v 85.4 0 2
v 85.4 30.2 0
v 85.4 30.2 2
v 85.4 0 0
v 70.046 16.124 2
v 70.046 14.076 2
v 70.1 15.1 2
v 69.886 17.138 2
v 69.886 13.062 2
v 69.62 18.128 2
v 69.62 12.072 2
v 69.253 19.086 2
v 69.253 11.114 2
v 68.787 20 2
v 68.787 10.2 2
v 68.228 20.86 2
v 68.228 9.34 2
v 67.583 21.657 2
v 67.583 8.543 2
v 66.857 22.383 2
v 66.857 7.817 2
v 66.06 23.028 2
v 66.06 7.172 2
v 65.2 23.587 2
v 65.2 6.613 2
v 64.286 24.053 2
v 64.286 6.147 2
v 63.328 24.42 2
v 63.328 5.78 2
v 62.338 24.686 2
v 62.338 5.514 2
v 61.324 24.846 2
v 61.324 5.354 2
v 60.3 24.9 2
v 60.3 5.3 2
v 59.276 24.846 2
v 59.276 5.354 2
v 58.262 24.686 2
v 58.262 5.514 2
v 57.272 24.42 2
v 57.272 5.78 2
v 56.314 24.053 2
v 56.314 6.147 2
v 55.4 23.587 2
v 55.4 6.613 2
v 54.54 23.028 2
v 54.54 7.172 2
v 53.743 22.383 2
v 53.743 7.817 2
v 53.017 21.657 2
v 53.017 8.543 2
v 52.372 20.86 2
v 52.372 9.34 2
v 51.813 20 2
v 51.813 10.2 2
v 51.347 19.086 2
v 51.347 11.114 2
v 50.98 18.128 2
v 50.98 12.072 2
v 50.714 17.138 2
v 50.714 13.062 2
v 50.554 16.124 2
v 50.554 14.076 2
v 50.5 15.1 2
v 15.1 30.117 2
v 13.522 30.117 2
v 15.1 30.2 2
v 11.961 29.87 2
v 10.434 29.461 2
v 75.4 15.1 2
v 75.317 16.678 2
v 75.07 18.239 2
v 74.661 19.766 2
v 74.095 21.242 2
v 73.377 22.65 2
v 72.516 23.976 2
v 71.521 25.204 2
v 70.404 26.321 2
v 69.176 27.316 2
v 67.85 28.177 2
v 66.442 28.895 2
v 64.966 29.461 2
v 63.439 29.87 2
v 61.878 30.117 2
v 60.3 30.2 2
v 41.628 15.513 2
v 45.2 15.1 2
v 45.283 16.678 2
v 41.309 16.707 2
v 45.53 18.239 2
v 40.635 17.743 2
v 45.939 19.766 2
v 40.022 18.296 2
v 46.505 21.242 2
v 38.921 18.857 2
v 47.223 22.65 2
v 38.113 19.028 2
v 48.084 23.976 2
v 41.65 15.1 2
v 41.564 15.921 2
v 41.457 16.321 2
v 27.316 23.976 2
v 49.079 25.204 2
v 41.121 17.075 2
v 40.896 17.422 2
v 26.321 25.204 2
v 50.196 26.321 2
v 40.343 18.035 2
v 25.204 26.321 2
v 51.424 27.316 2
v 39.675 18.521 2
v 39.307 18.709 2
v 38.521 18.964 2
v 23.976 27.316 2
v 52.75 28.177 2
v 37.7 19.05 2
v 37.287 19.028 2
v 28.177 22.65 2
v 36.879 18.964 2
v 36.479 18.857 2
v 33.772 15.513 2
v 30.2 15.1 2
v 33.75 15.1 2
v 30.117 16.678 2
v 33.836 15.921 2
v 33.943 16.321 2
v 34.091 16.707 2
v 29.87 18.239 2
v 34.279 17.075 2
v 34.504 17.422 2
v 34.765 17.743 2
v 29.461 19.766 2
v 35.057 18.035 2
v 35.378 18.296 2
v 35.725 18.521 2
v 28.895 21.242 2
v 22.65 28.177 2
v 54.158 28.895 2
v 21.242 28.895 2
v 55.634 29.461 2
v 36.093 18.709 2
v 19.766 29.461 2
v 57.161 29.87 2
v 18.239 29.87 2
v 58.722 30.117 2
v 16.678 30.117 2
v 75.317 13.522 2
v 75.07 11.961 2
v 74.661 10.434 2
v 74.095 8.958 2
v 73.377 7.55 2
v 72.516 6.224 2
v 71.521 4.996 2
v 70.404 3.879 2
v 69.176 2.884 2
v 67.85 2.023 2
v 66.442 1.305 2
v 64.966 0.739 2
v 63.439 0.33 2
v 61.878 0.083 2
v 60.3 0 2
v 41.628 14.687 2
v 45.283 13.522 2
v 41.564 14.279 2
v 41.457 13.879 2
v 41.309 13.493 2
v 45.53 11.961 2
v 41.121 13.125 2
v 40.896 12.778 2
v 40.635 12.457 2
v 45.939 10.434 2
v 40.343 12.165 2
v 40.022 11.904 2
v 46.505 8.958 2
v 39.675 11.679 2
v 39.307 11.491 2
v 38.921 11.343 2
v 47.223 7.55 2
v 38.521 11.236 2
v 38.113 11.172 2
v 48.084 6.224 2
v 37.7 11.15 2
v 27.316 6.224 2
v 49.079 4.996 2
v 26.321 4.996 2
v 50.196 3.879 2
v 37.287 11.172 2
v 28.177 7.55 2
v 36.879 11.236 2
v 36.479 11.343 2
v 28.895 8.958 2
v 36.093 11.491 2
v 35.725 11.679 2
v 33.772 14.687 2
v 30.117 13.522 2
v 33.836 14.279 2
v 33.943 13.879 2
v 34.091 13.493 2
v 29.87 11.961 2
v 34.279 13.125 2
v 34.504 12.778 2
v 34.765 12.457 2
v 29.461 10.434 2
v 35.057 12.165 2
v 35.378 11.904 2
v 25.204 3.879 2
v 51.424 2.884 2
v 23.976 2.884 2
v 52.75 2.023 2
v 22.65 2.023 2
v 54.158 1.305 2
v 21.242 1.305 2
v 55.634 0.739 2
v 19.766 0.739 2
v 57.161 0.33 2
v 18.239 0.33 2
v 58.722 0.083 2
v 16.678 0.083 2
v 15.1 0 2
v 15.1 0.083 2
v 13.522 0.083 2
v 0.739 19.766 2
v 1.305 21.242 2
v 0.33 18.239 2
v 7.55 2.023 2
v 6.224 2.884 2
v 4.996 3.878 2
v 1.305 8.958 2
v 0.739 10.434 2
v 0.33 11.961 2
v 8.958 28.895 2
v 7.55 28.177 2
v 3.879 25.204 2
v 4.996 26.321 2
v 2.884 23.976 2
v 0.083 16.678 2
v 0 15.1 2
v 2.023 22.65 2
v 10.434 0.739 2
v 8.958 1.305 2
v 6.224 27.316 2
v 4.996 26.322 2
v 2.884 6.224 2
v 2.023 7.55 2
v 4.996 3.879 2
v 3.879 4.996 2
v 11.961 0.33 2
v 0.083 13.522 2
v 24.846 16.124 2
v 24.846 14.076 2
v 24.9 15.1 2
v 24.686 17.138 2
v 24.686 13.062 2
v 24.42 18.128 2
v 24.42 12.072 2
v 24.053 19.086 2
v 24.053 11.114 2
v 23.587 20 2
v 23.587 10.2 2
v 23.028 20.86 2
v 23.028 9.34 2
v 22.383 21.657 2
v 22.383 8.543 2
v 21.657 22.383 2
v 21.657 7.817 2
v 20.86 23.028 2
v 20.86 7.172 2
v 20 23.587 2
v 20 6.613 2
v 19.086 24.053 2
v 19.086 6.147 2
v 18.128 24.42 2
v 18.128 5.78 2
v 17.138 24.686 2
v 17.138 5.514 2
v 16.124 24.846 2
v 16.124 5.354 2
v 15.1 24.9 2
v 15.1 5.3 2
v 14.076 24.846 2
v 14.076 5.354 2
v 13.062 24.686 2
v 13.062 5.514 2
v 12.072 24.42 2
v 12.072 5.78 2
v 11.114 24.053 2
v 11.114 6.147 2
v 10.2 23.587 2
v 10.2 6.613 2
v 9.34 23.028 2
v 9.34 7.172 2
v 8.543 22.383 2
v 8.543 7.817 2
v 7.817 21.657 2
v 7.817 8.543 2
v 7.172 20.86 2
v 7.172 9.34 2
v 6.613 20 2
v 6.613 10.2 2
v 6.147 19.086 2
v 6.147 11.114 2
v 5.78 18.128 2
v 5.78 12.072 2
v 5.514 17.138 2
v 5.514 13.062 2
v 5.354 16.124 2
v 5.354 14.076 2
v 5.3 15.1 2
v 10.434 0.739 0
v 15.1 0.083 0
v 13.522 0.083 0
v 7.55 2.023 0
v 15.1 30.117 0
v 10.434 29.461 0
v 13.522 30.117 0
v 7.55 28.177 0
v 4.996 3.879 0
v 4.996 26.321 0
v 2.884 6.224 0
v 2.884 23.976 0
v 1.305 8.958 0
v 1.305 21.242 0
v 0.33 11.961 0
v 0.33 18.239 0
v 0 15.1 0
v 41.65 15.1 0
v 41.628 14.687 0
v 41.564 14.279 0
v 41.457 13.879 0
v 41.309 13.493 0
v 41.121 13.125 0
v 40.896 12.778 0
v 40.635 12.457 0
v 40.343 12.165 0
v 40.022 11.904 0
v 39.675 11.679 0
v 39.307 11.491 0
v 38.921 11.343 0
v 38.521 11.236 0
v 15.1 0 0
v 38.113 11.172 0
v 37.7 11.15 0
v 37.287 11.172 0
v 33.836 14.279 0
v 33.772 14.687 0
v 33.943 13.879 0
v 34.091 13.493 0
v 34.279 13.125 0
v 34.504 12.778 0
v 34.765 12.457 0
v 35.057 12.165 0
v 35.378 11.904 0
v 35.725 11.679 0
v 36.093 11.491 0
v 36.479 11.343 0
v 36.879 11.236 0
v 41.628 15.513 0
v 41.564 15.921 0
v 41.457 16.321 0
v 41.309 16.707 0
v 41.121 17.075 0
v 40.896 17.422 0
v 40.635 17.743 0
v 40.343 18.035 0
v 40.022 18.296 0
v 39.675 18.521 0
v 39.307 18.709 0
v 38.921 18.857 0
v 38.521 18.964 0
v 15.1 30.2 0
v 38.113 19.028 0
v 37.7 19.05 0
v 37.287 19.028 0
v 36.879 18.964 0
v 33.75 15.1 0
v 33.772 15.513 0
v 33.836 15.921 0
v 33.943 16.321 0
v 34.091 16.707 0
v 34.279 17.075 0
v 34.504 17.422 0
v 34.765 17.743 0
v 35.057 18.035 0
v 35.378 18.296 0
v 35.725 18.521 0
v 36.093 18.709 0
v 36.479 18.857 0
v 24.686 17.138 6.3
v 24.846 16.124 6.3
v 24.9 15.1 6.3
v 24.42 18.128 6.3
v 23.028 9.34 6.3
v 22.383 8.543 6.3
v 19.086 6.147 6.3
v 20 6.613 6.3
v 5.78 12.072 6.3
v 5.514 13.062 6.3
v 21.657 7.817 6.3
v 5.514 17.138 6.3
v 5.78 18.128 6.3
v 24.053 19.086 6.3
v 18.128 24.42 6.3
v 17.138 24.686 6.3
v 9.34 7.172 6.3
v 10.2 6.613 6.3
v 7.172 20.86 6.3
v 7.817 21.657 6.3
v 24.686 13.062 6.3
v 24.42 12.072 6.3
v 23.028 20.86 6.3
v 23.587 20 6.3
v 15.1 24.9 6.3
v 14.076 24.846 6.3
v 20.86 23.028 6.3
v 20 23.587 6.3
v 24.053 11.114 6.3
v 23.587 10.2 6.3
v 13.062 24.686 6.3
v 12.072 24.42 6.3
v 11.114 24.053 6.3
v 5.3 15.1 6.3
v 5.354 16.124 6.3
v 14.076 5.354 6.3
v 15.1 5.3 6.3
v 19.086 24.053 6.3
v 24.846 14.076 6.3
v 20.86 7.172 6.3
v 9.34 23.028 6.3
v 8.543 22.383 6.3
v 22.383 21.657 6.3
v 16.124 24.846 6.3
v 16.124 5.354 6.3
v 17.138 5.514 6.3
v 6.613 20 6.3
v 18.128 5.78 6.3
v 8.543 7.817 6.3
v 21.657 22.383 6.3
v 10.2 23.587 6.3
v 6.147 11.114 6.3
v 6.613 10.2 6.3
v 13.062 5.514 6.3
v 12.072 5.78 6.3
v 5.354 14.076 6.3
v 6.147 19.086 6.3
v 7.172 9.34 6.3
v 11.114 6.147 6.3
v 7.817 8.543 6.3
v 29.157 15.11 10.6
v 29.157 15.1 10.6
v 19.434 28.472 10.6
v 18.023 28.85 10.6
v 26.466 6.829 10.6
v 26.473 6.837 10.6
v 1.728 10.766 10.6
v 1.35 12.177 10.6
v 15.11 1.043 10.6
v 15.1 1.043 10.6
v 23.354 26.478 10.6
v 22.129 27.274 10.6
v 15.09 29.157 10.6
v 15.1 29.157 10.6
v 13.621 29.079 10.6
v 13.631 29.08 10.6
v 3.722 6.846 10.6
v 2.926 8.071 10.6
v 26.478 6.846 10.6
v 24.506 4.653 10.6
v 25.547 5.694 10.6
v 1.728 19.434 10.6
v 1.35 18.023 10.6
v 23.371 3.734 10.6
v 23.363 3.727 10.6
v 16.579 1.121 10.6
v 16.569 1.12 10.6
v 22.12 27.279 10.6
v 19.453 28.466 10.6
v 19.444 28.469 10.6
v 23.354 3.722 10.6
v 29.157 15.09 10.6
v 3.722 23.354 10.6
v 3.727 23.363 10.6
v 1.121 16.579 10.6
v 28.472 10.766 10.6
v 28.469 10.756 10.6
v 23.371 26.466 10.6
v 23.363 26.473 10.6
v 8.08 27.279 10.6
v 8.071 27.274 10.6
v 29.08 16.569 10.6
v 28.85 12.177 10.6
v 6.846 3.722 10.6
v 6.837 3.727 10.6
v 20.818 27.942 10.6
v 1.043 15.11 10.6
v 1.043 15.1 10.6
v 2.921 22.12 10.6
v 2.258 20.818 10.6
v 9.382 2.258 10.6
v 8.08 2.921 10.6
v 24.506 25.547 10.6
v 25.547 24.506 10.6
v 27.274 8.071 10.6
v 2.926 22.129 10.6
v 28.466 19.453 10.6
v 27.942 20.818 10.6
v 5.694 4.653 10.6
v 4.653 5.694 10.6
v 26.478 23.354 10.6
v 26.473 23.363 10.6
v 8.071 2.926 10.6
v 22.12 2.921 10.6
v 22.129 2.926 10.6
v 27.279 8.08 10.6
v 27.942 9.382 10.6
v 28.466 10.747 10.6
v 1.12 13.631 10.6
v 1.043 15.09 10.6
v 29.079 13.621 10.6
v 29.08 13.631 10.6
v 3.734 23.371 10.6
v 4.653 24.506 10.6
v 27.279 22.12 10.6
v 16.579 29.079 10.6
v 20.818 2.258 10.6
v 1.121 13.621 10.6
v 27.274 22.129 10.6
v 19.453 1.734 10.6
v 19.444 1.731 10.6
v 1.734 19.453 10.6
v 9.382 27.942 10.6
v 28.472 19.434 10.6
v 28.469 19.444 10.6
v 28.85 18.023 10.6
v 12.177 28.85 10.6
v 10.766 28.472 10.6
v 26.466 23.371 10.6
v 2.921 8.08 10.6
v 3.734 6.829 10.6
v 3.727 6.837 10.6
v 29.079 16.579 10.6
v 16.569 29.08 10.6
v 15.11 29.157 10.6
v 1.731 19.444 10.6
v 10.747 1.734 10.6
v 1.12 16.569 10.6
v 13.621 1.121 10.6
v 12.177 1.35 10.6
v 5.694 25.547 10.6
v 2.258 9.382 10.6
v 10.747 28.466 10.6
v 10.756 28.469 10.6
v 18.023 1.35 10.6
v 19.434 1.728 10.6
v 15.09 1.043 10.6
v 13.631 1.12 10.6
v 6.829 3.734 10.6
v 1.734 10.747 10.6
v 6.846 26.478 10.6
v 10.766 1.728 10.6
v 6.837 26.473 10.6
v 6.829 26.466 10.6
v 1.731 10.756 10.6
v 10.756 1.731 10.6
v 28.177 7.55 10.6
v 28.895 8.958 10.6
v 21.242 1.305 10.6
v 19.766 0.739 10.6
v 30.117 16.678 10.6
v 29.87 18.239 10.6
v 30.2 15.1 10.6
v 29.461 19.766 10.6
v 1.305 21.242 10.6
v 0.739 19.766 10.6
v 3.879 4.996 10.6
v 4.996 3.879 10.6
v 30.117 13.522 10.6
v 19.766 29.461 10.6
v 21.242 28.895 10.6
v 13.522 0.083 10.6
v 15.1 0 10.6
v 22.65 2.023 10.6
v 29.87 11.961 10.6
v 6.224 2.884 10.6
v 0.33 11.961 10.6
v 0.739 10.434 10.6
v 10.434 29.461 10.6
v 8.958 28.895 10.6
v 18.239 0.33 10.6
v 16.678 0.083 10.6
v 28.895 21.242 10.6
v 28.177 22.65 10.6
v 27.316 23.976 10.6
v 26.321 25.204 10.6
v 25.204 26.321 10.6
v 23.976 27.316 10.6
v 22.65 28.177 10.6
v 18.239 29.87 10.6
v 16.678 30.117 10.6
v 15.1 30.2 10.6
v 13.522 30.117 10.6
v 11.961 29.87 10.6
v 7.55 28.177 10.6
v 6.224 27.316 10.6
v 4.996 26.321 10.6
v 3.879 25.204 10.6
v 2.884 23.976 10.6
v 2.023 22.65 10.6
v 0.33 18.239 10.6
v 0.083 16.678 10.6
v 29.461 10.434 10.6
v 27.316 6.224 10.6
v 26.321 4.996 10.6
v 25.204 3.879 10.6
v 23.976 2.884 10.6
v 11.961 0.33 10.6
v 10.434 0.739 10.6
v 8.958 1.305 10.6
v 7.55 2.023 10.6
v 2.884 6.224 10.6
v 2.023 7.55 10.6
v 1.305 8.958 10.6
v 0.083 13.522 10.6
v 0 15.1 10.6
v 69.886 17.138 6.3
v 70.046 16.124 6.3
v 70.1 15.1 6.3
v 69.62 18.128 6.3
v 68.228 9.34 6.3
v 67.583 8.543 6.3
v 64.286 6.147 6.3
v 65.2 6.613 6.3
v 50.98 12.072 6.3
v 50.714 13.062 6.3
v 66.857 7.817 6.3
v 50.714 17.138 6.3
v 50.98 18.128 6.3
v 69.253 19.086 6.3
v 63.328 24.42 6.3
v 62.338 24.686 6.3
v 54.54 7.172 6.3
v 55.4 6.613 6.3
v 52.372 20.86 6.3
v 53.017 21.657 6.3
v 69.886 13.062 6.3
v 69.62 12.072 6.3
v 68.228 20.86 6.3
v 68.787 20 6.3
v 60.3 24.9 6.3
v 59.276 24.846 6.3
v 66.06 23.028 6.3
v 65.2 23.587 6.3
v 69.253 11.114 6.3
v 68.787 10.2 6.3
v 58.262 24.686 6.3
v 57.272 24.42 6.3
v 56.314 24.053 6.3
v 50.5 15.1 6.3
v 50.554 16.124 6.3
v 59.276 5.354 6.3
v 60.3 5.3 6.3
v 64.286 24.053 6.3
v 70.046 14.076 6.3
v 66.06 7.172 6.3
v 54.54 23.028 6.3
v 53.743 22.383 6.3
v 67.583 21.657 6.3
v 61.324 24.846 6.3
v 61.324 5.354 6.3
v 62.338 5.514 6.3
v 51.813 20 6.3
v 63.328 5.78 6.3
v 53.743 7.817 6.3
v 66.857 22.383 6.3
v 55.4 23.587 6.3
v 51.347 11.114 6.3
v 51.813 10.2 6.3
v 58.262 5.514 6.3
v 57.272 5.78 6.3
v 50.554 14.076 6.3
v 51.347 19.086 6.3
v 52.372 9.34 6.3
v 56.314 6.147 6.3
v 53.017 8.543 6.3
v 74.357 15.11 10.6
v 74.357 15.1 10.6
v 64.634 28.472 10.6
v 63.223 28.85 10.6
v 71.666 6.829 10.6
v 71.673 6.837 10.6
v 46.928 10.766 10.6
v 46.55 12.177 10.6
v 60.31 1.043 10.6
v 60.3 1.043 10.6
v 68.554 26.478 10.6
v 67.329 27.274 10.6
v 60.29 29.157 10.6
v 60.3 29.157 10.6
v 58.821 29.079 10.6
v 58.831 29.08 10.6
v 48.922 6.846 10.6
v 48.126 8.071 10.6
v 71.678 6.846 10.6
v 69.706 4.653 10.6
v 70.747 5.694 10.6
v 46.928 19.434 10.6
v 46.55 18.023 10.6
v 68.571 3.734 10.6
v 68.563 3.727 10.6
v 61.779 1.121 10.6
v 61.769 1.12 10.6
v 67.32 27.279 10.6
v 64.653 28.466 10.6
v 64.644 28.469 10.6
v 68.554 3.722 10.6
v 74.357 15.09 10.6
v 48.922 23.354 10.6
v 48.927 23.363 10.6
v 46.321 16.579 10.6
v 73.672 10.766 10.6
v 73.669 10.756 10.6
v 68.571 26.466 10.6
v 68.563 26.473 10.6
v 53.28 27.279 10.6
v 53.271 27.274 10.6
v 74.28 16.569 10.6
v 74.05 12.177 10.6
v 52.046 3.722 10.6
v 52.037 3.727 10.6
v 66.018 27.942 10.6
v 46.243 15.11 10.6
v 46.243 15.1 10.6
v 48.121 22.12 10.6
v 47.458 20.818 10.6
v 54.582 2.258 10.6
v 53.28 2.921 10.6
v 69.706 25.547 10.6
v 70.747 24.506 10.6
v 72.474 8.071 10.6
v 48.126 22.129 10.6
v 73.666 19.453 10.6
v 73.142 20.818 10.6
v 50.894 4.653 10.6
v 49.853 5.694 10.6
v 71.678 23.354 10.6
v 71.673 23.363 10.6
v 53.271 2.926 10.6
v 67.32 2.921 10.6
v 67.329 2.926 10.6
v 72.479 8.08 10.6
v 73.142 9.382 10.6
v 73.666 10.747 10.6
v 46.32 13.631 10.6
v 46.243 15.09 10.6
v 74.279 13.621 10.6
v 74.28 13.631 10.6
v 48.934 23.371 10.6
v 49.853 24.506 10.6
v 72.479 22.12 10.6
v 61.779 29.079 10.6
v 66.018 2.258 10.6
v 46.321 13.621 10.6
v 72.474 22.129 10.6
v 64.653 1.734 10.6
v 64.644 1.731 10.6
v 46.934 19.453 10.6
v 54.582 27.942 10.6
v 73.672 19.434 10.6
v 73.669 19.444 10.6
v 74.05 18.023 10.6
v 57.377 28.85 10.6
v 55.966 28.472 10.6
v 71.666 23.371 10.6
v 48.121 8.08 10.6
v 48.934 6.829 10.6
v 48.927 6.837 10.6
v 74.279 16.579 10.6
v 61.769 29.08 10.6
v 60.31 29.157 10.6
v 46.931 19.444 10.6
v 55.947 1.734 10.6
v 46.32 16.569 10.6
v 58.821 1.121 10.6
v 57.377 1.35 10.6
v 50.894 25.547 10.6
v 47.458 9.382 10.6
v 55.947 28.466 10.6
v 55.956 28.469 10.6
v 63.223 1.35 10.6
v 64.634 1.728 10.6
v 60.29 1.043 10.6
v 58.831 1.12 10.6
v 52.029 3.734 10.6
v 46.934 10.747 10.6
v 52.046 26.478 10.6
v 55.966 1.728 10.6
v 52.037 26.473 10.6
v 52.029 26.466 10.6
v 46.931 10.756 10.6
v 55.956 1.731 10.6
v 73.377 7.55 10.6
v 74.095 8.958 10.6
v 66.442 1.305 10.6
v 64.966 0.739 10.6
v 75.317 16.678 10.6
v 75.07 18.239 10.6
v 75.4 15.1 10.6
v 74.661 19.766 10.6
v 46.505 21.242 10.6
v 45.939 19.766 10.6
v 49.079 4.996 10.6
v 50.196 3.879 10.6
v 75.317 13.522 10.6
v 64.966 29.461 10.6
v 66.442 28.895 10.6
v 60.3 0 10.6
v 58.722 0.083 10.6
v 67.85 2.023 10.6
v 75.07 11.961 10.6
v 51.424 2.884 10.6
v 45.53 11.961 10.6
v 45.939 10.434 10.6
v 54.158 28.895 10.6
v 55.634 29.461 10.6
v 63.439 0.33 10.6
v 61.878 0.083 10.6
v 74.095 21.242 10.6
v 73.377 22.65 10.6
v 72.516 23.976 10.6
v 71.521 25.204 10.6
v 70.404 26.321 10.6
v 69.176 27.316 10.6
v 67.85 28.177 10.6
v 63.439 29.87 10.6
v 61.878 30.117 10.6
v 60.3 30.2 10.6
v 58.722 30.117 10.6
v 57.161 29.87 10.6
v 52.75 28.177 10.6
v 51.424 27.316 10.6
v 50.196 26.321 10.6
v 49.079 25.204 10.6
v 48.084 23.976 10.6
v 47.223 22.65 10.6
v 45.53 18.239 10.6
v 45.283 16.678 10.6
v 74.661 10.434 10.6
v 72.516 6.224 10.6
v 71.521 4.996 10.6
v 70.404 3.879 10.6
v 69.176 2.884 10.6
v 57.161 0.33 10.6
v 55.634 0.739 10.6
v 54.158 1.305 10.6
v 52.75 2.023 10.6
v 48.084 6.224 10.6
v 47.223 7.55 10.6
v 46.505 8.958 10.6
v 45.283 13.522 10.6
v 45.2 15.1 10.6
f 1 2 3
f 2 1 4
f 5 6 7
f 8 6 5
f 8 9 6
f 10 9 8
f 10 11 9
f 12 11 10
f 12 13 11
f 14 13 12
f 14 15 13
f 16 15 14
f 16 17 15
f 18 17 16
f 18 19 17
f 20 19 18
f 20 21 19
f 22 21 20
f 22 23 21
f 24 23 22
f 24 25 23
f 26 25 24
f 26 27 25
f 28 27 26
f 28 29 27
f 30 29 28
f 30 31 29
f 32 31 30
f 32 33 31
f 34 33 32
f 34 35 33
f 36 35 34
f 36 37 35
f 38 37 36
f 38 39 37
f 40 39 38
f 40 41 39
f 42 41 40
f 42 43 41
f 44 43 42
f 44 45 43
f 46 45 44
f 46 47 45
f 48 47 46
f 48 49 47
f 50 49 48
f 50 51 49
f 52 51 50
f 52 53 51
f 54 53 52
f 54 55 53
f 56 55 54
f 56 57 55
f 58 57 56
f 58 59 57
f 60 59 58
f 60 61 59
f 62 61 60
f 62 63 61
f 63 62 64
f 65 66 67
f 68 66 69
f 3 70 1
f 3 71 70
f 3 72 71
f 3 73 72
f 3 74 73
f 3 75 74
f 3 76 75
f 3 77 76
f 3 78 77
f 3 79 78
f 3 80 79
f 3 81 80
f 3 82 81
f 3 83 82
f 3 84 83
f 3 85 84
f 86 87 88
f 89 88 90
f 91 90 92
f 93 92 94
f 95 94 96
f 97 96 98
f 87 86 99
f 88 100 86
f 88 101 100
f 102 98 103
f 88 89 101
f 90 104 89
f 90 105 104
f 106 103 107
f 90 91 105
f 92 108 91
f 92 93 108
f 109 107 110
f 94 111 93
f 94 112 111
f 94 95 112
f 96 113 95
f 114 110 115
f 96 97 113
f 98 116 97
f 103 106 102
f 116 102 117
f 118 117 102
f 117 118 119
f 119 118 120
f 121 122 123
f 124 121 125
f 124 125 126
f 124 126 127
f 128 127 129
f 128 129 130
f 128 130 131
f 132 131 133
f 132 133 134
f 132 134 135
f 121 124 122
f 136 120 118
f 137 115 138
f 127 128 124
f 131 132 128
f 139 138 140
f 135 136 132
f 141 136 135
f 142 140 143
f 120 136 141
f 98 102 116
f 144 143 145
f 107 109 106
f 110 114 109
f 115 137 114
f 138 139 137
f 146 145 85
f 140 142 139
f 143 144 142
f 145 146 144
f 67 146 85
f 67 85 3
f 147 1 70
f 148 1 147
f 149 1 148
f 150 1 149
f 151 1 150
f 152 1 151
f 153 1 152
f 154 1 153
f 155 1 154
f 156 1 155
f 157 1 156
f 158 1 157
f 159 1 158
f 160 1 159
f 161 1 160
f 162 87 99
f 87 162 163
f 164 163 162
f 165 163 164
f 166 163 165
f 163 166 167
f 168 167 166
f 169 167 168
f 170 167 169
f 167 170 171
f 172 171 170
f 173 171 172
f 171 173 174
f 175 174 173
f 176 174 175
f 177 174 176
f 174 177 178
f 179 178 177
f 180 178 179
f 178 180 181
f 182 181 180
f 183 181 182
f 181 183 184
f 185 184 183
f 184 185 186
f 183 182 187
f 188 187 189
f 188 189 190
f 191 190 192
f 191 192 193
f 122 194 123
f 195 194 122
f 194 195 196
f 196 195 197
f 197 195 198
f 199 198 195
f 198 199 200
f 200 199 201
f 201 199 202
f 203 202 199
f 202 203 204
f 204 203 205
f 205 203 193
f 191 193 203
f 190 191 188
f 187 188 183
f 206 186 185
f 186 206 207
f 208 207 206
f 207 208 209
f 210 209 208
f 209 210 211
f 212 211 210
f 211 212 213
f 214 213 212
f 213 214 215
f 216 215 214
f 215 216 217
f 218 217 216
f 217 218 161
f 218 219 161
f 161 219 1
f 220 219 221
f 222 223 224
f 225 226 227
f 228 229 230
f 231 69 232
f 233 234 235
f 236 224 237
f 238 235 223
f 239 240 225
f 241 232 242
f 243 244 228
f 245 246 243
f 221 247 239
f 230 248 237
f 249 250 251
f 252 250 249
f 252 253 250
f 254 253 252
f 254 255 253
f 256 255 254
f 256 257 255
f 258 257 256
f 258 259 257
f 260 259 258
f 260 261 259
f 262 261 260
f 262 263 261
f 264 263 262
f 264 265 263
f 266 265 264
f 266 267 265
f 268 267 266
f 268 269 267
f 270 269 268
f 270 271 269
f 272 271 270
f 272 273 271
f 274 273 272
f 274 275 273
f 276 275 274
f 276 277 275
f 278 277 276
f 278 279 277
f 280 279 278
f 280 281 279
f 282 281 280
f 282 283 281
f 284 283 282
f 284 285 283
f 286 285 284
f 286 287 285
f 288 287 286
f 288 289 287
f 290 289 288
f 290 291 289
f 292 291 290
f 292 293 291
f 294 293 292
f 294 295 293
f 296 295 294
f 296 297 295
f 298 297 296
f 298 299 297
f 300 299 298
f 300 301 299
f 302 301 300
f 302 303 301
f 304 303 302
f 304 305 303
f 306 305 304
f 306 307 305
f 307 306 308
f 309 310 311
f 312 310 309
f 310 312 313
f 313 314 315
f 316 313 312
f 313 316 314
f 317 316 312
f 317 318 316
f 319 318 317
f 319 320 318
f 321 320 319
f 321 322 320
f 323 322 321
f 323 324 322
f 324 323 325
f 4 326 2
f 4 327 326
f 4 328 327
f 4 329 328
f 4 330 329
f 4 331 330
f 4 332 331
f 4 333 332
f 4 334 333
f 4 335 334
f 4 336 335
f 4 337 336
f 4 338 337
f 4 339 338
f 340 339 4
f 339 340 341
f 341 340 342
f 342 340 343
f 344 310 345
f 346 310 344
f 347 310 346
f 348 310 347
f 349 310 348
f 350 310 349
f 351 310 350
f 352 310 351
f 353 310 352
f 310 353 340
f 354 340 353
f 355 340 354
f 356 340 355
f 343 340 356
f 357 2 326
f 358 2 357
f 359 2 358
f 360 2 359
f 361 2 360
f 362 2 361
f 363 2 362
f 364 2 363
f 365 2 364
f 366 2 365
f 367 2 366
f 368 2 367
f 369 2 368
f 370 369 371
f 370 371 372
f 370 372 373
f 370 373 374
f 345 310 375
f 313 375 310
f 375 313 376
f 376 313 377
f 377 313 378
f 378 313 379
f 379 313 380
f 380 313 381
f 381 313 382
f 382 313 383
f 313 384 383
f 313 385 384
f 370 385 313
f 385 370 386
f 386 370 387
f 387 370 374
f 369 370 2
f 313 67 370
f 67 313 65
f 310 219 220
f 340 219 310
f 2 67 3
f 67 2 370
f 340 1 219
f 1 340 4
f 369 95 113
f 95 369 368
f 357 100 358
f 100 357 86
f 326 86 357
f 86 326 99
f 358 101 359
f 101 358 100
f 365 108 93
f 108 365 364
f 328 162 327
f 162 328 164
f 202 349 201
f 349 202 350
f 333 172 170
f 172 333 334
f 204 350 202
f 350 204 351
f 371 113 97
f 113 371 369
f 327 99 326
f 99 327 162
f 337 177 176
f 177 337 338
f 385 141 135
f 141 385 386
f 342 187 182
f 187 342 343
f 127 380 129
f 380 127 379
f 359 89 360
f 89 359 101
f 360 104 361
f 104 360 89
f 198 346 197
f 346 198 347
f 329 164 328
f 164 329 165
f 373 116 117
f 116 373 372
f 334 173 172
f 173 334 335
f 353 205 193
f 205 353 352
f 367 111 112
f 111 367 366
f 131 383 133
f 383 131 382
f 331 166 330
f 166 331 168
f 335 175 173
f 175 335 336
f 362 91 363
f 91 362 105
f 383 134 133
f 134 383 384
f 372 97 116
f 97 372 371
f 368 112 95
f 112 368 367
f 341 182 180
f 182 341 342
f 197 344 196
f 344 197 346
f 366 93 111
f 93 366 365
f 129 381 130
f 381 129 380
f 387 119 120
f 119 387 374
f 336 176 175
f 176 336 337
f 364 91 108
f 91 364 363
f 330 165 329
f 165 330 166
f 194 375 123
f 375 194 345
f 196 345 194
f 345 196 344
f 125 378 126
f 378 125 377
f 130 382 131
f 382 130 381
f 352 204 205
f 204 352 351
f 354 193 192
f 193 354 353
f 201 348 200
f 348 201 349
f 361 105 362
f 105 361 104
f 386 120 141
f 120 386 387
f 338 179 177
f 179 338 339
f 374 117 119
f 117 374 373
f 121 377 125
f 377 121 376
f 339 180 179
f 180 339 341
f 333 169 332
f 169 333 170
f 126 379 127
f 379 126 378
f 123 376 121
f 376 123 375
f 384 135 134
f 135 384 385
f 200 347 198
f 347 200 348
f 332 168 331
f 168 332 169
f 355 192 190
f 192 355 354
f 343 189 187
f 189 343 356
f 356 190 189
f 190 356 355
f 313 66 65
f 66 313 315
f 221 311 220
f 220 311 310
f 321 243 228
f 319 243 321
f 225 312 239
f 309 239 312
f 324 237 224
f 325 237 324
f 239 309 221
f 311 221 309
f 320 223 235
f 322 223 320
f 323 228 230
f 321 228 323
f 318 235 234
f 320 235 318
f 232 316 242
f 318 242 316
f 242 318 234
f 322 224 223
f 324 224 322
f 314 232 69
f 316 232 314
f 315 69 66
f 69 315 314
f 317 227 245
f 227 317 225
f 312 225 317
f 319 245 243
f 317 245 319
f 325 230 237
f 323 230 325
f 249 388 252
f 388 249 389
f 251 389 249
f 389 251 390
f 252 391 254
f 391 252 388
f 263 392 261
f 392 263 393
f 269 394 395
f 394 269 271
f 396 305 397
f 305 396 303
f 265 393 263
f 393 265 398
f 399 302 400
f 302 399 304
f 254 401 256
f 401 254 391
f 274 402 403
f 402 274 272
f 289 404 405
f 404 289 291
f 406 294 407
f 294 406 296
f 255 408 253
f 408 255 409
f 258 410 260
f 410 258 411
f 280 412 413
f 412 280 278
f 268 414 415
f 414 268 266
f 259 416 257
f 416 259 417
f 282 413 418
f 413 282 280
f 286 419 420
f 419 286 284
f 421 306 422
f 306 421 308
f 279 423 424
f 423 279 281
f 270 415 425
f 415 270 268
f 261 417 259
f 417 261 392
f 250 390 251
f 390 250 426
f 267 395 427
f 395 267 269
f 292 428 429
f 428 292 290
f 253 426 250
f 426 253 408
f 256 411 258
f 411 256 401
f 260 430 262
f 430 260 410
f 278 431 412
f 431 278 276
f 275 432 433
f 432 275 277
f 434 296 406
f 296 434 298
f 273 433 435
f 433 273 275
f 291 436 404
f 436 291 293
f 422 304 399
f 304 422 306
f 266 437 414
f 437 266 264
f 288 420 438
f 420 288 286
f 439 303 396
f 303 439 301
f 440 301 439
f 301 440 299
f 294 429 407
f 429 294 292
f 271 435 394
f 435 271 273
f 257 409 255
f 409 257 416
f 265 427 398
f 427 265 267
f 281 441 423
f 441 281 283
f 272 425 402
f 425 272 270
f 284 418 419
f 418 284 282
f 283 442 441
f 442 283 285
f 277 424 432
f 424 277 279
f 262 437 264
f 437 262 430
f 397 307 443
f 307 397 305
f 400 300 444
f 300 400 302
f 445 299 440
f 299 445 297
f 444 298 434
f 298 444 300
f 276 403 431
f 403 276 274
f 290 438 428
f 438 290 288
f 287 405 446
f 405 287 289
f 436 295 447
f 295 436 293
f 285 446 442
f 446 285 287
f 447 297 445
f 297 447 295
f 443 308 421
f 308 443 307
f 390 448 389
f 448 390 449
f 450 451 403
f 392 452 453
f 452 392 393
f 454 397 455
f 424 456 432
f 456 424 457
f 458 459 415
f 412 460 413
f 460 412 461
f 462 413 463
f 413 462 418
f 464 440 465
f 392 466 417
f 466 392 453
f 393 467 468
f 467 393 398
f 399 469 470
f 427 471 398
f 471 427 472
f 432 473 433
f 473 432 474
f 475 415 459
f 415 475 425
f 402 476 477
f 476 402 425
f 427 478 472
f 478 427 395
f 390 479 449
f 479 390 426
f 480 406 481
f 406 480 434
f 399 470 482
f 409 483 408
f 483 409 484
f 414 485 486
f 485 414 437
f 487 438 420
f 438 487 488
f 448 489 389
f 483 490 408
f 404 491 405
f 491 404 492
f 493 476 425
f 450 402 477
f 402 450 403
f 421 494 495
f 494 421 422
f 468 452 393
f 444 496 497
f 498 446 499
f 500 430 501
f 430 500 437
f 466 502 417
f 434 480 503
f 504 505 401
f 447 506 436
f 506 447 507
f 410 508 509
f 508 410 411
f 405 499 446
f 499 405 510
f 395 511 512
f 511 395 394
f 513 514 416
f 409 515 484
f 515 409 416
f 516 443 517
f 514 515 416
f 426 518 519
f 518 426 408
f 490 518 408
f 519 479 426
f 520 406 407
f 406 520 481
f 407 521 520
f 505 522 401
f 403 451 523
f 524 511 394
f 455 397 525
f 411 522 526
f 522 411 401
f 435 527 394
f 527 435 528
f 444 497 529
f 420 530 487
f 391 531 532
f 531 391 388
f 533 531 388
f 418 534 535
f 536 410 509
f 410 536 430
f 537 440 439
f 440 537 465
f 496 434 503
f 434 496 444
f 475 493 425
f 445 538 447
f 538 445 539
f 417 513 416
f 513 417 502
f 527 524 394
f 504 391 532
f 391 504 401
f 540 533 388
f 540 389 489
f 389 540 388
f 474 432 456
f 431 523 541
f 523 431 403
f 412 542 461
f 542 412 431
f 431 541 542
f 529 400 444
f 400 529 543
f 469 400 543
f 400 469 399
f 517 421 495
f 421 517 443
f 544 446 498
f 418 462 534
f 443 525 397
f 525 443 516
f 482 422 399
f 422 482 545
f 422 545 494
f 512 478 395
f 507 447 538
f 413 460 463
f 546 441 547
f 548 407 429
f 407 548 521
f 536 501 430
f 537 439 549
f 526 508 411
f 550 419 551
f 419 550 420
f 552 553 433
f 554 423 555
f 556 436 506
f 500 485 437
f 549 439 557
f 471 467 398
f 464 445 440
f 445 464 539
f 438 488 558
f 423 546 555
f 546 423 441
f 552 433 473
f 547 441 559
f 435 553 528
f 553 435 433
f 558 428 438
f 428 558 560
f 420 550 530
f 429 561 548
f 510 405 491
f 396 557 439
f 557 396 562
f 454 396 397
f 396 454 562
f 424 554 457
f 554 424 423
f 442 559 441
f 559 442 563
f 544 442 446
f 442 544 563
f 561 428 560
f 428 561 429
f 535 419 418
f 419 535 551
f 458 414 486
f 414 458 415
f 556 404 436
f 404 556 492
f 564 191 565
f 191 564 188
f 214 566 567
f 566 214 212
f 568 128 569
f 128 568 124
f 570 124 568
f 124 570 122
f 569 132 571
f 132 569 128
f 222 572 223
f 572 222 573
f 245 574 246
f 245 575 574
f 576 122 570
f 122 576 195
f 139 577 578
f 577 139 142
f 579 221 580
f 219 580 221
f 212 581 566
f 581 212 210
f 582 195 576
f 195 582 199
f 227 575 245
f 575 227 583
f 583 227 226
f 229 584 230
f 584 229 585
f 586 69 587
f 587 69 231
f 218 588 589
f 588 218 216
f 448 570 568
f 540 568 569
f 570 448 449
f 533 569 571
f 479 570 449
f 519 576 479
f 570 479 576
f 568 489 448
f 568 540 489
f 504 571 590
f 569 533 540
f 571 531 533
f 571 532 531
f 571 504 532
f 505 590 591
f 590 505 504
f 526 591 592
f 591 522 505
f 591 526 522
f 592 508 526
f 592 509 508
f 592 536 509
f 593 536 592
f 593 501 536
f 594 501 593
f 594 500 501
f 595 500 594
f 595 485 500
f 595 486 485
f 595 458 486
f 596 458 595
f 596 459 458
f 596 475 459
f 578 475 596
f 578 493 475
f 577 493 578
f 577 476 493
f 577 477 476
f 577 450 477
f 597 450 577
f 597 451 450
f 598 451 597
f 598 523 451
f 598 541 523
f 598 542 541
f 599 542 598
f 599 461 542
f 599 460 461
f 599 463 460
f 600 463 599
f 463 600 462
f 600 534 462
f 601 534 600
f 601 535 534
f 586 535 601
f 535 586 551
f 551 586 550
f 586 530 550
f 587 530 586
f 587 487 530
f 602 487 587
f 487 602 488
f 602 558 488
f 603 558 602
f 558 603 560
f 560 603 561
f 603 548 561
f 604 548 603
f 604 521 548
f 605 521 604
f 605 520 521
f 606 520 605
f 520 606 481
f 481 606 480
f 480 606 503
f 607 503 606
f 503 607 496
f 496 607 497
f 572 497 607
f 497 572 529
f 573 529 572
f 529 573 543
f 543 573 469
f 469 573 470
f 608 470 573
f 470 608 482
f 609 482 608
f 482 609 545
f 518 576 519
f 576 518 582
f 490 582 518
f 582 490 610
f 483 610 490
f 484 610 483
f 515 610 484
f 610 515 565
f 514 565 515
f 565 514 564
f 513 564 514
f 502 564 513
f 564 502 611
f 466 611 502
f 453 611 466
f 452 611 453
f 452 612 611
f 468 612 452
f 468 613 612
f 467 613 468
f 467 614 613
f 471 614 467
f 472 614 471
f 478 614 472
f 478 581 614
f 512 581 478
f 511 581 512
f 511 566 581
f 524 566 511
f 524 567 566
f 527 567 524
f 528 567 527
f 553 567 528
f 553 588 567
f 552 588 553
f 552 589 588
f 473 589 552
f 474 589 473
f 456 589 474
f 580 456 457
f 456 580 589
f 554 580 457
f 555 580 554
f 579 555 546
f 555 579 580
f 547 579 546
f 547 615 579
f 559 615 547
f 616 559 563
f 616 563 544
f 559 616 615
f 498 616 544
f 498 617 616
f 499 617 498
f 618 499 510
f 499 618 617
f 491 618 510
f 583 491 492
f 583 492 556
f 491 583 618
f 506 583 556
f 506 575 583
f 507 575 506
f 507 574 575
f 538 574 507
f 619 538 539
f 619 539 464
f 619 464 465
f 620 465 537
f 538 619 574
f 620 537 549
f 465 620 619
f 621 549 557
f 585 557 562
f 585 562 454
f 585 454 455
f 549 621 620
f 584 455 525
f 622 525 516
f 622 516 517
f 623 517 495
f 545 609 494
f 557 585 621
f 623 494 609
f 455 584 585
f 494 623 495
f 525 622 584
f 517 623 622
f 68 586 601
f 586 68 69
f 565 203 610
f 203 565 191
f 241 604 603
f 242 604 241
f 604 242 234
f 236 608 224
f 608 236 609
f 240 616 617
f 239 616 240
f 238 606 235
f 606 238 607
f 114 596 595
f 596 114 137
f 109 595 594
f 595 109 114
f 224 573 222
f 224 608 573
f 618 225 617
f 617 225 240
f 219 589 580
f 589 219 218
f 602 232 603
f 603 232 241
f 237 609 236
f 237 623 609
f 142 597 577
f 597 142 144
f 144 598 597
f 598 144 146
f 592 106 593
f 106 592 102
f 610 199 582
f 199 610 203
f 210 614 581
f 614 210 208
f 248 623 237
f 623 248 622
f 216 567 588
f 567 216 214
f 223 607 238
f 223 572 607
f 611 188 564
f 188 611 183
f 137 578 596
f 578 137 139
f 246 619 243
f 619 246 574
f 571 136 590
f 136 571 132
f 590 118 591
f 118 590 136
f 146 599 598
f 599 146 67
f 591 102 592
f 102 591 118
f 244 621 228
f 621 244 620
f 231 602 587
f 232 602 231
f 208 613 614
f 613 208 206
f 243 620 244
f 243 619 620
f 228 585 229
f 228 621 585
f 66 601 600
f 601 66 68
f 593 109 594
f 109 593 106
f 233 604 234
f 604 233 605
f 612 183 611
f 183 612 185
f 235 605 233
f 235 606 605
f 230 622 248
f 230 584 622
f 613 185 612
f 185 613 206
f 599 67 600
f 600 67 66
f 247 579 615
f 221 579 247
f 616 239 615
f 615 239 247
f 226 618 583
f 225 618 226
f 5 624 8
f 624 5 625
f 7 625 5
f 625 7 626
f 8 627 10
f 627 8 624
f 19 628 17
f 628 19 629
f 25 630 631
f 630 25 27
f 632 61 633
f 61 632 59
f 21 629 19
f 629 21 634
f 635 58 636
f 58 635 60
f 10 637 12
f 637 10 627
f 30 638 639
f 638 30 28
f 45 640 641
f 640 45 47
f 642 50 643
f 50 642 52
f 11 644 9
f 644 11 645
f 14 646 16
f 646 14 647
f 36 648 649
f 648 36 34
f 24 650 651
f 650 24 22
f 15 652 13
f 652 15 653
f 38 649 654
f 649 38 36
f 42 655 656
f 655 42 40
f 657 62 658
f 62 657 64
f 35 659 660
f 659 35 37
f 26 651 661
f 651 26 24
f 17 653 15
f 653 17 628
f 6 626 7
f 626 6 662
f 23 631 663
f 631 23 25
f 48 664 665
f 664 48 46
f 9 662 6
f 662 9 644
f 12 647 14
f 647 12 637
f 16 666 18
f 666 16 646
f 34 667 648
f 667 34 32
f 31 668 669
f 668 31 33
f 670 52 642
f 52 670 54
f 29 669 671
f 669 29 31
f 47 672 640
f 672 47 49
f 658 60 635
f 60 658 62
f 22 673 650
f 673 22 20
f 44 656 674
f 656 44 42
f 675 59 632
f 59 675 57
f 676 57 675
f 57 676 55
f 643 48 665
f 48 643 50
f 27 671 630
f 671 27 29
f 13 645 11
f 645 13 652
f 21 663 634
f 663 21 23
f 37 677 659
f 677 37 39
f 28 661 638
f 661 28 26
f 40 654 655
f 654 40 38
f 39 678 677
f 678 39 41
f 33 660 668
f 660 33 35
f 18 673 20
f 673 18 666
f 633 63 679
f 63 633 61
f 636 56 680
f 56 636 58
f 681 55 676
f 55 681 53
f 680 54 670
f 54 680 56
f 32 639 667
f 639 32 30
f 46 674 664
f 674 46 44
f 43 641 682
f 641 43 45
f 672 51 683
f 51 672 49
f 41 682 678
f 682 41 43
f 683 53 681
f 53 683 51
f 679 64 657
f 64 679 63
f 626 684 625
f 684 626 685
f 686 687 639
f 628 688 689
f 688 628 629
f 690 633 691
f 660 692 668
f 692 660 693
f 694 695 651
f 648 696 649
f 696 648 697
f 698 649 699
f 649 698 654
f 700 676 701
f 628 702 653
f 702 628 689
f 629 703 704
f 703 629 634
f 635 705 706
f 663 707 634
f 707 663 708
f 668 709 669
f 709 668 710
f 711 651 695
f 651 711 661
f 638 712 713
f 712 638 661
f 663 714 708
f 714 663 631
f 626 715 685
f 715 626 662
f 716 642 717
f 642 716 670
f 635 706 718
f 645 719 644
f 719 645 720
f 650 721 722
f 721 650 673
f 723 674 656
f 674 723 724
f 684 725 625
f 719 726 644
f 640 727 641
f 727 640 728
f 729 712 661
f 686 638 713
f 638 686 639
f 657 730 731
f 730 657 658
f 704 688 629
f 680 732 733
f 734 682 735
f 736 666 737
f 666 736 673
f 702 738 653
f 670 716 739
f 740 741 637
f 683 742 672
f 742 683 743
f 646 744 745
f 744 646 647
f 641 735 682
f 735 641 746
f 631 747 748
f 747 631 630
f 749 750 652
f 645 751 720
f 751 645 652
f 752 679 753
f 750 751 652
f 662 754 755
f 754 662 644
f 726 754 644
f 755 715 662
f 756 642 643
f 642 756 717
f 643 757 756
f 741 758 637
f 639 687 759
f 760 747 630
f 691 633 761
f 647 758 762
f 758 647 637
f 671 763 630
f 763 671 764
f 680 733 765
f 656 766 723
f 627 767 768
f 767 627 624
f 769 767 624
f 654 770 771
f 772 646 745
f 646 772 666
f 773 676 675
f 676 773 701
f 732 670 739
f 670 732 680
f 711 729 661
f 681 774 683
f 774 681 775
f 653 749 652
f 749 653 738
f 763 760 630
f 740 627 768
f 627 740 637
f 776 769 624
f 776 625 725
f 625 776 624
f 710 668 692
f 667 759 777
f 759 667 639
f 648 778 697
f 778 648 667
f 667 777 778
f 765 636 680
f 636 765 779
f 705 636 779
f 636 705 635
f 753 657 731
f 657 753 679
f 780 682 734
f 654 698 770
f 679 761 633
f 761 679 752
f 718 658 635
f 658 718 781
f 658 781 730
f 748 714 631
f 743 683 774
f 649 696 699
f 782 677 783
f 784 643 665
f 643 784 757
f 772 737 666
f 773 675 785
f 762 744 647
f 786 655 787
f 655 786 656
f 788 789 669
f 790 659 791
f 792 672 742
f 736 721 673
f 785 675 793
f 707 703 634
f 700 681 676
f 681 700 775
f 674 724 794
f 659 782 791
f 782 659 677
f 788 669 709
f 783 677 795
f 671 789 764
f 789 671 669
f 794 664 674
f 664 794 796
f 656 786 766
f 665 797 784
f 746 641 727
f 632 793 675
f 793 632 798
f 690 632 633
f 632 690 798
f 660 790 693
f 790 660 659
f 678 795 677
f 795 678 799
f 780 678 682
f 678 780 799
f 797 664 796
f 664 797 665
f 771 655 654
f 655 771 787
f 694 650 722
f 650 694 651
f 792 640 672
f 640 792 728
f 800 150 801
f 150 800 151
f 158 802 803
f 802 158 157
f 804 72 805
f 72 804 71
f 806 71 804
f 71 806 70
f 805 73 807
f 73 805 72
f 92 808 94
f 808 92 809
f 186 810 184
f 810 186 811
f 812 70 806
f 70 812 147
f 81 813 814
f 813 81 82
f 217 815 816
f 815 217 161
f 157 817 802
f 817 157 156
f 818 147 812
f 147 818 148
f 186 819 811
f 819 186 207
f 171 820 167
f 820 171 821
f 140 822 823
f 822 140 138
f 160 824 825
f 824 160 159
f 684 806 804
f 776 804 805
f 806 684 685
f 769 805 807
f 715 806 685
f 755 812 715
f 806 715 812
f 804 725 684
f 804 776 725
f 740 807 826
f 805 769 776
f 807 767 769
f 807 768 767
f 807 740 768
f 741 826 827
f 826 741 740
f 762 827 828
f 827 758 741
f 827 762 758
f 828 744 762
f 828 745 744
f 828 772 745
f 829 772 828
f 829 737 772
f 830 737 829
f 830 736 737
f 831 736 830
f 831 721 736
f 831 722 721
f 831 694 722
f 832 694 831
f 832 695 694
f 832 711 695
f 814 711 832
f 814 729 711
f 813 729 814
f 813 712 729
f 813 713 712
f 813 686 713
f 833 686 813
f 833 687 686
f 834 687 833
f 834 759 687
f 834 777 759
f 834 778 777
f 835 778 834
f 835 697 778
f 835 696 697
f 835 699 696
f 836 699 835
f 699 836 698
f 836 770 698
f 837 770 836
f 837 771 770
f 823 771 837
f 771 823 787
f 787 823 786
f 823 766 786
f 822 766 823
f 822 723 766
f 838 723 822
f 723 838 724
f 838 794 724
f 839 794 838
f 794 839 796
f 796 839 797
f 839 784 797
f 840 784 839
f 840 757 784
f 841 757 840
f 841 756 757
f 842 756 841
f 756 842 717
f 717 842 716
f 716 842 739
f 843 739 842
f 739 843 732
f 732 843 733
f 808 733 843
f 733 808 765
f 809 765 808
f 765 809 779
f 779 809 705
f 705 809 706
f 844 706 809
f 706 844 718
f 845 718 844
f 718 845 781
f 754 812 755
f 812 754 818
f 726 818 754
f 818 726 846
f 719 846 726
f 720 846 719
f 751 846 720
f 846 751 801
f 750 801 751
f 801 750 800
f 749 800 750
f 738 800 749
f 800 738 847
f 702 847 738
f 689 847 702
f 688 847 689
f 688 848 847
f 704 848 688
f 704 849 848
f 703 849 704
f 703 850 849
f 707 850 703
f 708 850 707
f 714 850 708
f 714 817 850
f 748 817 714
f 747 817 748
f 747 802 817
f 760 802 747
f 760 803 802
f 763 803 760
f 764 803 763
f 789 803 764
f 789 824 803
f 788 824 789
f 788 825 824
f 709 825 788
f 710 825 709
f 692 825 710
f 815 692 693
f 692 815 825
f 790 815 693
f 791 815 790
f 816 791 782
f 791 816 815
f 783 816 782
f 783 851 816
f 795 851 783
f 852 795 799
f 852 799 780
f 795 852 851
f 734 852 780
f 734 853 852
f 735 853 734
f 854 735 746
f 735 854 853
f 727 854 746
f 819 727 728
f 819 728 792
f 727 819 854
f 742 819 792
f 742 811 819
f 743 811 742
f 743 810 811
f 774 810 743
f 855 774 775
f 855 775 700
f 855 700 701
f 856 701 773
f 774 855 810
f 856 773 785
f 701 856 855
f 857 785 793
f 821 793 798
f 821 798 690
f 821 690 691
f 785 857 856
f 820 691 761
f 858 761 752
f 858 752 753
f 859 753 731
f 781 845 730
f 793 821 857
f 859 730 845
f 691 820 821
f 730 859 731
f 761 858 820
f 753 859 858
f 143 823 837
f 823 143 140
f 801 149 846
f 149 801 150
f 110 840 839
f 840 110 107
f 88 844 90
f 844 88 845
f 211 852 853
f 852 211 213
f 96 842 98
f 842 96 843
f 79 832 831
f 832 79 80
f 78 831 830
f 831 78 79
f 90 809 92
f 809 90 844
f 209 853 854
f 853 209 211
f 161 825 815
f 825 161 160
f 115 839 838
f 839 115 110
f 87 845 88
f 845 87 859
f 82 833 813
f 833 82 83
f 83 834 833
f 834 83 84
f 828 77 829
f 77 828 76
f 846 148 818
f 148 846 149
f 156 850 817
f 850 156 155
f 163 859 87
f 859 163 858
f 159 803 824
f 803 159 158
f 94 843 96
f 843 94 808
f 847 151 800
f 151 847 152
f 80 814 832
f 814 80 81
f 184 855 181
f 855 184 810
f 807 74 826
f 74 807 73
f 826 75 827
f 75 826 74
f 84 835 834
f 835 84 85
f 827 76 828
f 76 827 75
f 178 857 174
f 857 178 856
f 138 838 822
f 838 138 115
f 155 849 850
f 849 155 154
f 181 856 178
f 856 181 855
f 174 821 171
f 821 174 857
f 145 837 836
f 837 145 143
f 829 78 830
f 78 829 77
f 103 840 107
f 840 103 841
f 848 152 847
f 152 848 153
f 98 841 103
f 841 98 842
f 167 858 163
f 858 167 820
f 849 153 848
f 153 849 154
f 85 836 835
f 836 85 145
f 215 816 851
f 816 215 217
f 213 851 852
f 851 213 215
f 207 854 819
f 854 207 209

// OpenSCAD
//
// Project: CMRig - BumpStop part A - this attaches to the affector platform adaptor
// History: Y16M09D08 JMJ  Started 1st version
//

// Parameters
magnetDia=19.1; // actual magnet dia
magnetHeight=4.8; // actual magnet height
magnetDiaSpace=0.5; // wiggle room for magnet
magnetHeightContraction=0.5; // make the depth slight less than magnet.

hCone = magnetHeight-magnetHeightContraction; // Height of cone
hMagnet = magnetHeight-magnetHeightContraction; // Height of magnet well
holeInnerDia = magnetDia+magnetDiaSpace; // narrow part of cone
holeOuterDia = holeInnerDia+2*hCone; // wider part of cone - 45 degree cone.
wallThickness=2; // also base thickness.
outerDia = holeOuterDia+max(2,wallThickness); // of magnet recepticle
switchDia = 7.9; // Hole to place switch.
// Note: pushbutton switch is located midway between holes.
switchFootprintDia = 9.9; // Diameter of pushbutton flange

holeDistanceGap = max(switchFootprintDia+2, 15); // Make sure there is enough distance to place the switch!
holeDistance = outerDia+holeDistanceGap; // distance between the 2 holes for magnets


baseLengthExtra = 10; // How much extra length to base
baseLength = 2*outerDia + holeDistanceGap + baseLengthExtra; // (printed along x)
baseWidth = outerDia; //(along y)
baseDepth = wallThickness; // (along z)


union() {
    x1 = outerDia/2; // x position of center of first magnet recepticle
    x2 = x1 + holeDistance; // x position for 2nd center...
    switchX = (x1+x2)/2; //midway between the two
    
    // Base    
    base(baseLength, baseWidth, switchDia, switchX);
    
    // The two magnet receptacles...
    translate([x1, baseWidth/2, baseDepth])
        magnetReceptacle(holeInnerDia, holeOuterDia, outerDia, hMagnet, hCone, $fn=60);    
    translate([x2, baseWidth/2, baseDepth])
        magnetReceptacle(holeInnerDia, holeOuterDia, outerDia, hMagnet, hCone, $fn=60);
}

// The base
//   switchDia: dia of switch hole
//   switchX: x position of center of switch hole
//  Note: the end closer to x=0 is a semi-circle
module base(baseLength, baseWidth, switchDia, switchX) {
    union() {
        translate([baseWidth/2, baseWidth/2, 0]) 
            cylinder(h=baseDepth, d=baseWidth);
        difference() {
            translate([baseWidth/2, 0, 0])
                cube([baseLength-baseWidth/2, baseWidth, baseDepth]);
            translate([switchX, baseWidth/2, -1])
                cylinder(h=baseLength+2, d=switchDia, $fn=60);
        }
    }
}

// A single magnet Recptacle
// It is centered on the origin
// Overall depth (along z) is (hMagnet+hCone)
module magnetReceptacle(holeInnerDia, holeOuterDia, outerDia, hMagnet, hCone) {
    difference() {
        cylinder(h=hMagnet+hCone, d=outerDia);
        union() {
            translate([0,0,-1])
                cylinder(h=hMagnet+2, d=holeInnerDia);
            translate([0,0, hMagnet])
                cylinder(h=hCone*1.01, d1=holeInnerDia, d2=holeOuterDia);
        }
    }
}
